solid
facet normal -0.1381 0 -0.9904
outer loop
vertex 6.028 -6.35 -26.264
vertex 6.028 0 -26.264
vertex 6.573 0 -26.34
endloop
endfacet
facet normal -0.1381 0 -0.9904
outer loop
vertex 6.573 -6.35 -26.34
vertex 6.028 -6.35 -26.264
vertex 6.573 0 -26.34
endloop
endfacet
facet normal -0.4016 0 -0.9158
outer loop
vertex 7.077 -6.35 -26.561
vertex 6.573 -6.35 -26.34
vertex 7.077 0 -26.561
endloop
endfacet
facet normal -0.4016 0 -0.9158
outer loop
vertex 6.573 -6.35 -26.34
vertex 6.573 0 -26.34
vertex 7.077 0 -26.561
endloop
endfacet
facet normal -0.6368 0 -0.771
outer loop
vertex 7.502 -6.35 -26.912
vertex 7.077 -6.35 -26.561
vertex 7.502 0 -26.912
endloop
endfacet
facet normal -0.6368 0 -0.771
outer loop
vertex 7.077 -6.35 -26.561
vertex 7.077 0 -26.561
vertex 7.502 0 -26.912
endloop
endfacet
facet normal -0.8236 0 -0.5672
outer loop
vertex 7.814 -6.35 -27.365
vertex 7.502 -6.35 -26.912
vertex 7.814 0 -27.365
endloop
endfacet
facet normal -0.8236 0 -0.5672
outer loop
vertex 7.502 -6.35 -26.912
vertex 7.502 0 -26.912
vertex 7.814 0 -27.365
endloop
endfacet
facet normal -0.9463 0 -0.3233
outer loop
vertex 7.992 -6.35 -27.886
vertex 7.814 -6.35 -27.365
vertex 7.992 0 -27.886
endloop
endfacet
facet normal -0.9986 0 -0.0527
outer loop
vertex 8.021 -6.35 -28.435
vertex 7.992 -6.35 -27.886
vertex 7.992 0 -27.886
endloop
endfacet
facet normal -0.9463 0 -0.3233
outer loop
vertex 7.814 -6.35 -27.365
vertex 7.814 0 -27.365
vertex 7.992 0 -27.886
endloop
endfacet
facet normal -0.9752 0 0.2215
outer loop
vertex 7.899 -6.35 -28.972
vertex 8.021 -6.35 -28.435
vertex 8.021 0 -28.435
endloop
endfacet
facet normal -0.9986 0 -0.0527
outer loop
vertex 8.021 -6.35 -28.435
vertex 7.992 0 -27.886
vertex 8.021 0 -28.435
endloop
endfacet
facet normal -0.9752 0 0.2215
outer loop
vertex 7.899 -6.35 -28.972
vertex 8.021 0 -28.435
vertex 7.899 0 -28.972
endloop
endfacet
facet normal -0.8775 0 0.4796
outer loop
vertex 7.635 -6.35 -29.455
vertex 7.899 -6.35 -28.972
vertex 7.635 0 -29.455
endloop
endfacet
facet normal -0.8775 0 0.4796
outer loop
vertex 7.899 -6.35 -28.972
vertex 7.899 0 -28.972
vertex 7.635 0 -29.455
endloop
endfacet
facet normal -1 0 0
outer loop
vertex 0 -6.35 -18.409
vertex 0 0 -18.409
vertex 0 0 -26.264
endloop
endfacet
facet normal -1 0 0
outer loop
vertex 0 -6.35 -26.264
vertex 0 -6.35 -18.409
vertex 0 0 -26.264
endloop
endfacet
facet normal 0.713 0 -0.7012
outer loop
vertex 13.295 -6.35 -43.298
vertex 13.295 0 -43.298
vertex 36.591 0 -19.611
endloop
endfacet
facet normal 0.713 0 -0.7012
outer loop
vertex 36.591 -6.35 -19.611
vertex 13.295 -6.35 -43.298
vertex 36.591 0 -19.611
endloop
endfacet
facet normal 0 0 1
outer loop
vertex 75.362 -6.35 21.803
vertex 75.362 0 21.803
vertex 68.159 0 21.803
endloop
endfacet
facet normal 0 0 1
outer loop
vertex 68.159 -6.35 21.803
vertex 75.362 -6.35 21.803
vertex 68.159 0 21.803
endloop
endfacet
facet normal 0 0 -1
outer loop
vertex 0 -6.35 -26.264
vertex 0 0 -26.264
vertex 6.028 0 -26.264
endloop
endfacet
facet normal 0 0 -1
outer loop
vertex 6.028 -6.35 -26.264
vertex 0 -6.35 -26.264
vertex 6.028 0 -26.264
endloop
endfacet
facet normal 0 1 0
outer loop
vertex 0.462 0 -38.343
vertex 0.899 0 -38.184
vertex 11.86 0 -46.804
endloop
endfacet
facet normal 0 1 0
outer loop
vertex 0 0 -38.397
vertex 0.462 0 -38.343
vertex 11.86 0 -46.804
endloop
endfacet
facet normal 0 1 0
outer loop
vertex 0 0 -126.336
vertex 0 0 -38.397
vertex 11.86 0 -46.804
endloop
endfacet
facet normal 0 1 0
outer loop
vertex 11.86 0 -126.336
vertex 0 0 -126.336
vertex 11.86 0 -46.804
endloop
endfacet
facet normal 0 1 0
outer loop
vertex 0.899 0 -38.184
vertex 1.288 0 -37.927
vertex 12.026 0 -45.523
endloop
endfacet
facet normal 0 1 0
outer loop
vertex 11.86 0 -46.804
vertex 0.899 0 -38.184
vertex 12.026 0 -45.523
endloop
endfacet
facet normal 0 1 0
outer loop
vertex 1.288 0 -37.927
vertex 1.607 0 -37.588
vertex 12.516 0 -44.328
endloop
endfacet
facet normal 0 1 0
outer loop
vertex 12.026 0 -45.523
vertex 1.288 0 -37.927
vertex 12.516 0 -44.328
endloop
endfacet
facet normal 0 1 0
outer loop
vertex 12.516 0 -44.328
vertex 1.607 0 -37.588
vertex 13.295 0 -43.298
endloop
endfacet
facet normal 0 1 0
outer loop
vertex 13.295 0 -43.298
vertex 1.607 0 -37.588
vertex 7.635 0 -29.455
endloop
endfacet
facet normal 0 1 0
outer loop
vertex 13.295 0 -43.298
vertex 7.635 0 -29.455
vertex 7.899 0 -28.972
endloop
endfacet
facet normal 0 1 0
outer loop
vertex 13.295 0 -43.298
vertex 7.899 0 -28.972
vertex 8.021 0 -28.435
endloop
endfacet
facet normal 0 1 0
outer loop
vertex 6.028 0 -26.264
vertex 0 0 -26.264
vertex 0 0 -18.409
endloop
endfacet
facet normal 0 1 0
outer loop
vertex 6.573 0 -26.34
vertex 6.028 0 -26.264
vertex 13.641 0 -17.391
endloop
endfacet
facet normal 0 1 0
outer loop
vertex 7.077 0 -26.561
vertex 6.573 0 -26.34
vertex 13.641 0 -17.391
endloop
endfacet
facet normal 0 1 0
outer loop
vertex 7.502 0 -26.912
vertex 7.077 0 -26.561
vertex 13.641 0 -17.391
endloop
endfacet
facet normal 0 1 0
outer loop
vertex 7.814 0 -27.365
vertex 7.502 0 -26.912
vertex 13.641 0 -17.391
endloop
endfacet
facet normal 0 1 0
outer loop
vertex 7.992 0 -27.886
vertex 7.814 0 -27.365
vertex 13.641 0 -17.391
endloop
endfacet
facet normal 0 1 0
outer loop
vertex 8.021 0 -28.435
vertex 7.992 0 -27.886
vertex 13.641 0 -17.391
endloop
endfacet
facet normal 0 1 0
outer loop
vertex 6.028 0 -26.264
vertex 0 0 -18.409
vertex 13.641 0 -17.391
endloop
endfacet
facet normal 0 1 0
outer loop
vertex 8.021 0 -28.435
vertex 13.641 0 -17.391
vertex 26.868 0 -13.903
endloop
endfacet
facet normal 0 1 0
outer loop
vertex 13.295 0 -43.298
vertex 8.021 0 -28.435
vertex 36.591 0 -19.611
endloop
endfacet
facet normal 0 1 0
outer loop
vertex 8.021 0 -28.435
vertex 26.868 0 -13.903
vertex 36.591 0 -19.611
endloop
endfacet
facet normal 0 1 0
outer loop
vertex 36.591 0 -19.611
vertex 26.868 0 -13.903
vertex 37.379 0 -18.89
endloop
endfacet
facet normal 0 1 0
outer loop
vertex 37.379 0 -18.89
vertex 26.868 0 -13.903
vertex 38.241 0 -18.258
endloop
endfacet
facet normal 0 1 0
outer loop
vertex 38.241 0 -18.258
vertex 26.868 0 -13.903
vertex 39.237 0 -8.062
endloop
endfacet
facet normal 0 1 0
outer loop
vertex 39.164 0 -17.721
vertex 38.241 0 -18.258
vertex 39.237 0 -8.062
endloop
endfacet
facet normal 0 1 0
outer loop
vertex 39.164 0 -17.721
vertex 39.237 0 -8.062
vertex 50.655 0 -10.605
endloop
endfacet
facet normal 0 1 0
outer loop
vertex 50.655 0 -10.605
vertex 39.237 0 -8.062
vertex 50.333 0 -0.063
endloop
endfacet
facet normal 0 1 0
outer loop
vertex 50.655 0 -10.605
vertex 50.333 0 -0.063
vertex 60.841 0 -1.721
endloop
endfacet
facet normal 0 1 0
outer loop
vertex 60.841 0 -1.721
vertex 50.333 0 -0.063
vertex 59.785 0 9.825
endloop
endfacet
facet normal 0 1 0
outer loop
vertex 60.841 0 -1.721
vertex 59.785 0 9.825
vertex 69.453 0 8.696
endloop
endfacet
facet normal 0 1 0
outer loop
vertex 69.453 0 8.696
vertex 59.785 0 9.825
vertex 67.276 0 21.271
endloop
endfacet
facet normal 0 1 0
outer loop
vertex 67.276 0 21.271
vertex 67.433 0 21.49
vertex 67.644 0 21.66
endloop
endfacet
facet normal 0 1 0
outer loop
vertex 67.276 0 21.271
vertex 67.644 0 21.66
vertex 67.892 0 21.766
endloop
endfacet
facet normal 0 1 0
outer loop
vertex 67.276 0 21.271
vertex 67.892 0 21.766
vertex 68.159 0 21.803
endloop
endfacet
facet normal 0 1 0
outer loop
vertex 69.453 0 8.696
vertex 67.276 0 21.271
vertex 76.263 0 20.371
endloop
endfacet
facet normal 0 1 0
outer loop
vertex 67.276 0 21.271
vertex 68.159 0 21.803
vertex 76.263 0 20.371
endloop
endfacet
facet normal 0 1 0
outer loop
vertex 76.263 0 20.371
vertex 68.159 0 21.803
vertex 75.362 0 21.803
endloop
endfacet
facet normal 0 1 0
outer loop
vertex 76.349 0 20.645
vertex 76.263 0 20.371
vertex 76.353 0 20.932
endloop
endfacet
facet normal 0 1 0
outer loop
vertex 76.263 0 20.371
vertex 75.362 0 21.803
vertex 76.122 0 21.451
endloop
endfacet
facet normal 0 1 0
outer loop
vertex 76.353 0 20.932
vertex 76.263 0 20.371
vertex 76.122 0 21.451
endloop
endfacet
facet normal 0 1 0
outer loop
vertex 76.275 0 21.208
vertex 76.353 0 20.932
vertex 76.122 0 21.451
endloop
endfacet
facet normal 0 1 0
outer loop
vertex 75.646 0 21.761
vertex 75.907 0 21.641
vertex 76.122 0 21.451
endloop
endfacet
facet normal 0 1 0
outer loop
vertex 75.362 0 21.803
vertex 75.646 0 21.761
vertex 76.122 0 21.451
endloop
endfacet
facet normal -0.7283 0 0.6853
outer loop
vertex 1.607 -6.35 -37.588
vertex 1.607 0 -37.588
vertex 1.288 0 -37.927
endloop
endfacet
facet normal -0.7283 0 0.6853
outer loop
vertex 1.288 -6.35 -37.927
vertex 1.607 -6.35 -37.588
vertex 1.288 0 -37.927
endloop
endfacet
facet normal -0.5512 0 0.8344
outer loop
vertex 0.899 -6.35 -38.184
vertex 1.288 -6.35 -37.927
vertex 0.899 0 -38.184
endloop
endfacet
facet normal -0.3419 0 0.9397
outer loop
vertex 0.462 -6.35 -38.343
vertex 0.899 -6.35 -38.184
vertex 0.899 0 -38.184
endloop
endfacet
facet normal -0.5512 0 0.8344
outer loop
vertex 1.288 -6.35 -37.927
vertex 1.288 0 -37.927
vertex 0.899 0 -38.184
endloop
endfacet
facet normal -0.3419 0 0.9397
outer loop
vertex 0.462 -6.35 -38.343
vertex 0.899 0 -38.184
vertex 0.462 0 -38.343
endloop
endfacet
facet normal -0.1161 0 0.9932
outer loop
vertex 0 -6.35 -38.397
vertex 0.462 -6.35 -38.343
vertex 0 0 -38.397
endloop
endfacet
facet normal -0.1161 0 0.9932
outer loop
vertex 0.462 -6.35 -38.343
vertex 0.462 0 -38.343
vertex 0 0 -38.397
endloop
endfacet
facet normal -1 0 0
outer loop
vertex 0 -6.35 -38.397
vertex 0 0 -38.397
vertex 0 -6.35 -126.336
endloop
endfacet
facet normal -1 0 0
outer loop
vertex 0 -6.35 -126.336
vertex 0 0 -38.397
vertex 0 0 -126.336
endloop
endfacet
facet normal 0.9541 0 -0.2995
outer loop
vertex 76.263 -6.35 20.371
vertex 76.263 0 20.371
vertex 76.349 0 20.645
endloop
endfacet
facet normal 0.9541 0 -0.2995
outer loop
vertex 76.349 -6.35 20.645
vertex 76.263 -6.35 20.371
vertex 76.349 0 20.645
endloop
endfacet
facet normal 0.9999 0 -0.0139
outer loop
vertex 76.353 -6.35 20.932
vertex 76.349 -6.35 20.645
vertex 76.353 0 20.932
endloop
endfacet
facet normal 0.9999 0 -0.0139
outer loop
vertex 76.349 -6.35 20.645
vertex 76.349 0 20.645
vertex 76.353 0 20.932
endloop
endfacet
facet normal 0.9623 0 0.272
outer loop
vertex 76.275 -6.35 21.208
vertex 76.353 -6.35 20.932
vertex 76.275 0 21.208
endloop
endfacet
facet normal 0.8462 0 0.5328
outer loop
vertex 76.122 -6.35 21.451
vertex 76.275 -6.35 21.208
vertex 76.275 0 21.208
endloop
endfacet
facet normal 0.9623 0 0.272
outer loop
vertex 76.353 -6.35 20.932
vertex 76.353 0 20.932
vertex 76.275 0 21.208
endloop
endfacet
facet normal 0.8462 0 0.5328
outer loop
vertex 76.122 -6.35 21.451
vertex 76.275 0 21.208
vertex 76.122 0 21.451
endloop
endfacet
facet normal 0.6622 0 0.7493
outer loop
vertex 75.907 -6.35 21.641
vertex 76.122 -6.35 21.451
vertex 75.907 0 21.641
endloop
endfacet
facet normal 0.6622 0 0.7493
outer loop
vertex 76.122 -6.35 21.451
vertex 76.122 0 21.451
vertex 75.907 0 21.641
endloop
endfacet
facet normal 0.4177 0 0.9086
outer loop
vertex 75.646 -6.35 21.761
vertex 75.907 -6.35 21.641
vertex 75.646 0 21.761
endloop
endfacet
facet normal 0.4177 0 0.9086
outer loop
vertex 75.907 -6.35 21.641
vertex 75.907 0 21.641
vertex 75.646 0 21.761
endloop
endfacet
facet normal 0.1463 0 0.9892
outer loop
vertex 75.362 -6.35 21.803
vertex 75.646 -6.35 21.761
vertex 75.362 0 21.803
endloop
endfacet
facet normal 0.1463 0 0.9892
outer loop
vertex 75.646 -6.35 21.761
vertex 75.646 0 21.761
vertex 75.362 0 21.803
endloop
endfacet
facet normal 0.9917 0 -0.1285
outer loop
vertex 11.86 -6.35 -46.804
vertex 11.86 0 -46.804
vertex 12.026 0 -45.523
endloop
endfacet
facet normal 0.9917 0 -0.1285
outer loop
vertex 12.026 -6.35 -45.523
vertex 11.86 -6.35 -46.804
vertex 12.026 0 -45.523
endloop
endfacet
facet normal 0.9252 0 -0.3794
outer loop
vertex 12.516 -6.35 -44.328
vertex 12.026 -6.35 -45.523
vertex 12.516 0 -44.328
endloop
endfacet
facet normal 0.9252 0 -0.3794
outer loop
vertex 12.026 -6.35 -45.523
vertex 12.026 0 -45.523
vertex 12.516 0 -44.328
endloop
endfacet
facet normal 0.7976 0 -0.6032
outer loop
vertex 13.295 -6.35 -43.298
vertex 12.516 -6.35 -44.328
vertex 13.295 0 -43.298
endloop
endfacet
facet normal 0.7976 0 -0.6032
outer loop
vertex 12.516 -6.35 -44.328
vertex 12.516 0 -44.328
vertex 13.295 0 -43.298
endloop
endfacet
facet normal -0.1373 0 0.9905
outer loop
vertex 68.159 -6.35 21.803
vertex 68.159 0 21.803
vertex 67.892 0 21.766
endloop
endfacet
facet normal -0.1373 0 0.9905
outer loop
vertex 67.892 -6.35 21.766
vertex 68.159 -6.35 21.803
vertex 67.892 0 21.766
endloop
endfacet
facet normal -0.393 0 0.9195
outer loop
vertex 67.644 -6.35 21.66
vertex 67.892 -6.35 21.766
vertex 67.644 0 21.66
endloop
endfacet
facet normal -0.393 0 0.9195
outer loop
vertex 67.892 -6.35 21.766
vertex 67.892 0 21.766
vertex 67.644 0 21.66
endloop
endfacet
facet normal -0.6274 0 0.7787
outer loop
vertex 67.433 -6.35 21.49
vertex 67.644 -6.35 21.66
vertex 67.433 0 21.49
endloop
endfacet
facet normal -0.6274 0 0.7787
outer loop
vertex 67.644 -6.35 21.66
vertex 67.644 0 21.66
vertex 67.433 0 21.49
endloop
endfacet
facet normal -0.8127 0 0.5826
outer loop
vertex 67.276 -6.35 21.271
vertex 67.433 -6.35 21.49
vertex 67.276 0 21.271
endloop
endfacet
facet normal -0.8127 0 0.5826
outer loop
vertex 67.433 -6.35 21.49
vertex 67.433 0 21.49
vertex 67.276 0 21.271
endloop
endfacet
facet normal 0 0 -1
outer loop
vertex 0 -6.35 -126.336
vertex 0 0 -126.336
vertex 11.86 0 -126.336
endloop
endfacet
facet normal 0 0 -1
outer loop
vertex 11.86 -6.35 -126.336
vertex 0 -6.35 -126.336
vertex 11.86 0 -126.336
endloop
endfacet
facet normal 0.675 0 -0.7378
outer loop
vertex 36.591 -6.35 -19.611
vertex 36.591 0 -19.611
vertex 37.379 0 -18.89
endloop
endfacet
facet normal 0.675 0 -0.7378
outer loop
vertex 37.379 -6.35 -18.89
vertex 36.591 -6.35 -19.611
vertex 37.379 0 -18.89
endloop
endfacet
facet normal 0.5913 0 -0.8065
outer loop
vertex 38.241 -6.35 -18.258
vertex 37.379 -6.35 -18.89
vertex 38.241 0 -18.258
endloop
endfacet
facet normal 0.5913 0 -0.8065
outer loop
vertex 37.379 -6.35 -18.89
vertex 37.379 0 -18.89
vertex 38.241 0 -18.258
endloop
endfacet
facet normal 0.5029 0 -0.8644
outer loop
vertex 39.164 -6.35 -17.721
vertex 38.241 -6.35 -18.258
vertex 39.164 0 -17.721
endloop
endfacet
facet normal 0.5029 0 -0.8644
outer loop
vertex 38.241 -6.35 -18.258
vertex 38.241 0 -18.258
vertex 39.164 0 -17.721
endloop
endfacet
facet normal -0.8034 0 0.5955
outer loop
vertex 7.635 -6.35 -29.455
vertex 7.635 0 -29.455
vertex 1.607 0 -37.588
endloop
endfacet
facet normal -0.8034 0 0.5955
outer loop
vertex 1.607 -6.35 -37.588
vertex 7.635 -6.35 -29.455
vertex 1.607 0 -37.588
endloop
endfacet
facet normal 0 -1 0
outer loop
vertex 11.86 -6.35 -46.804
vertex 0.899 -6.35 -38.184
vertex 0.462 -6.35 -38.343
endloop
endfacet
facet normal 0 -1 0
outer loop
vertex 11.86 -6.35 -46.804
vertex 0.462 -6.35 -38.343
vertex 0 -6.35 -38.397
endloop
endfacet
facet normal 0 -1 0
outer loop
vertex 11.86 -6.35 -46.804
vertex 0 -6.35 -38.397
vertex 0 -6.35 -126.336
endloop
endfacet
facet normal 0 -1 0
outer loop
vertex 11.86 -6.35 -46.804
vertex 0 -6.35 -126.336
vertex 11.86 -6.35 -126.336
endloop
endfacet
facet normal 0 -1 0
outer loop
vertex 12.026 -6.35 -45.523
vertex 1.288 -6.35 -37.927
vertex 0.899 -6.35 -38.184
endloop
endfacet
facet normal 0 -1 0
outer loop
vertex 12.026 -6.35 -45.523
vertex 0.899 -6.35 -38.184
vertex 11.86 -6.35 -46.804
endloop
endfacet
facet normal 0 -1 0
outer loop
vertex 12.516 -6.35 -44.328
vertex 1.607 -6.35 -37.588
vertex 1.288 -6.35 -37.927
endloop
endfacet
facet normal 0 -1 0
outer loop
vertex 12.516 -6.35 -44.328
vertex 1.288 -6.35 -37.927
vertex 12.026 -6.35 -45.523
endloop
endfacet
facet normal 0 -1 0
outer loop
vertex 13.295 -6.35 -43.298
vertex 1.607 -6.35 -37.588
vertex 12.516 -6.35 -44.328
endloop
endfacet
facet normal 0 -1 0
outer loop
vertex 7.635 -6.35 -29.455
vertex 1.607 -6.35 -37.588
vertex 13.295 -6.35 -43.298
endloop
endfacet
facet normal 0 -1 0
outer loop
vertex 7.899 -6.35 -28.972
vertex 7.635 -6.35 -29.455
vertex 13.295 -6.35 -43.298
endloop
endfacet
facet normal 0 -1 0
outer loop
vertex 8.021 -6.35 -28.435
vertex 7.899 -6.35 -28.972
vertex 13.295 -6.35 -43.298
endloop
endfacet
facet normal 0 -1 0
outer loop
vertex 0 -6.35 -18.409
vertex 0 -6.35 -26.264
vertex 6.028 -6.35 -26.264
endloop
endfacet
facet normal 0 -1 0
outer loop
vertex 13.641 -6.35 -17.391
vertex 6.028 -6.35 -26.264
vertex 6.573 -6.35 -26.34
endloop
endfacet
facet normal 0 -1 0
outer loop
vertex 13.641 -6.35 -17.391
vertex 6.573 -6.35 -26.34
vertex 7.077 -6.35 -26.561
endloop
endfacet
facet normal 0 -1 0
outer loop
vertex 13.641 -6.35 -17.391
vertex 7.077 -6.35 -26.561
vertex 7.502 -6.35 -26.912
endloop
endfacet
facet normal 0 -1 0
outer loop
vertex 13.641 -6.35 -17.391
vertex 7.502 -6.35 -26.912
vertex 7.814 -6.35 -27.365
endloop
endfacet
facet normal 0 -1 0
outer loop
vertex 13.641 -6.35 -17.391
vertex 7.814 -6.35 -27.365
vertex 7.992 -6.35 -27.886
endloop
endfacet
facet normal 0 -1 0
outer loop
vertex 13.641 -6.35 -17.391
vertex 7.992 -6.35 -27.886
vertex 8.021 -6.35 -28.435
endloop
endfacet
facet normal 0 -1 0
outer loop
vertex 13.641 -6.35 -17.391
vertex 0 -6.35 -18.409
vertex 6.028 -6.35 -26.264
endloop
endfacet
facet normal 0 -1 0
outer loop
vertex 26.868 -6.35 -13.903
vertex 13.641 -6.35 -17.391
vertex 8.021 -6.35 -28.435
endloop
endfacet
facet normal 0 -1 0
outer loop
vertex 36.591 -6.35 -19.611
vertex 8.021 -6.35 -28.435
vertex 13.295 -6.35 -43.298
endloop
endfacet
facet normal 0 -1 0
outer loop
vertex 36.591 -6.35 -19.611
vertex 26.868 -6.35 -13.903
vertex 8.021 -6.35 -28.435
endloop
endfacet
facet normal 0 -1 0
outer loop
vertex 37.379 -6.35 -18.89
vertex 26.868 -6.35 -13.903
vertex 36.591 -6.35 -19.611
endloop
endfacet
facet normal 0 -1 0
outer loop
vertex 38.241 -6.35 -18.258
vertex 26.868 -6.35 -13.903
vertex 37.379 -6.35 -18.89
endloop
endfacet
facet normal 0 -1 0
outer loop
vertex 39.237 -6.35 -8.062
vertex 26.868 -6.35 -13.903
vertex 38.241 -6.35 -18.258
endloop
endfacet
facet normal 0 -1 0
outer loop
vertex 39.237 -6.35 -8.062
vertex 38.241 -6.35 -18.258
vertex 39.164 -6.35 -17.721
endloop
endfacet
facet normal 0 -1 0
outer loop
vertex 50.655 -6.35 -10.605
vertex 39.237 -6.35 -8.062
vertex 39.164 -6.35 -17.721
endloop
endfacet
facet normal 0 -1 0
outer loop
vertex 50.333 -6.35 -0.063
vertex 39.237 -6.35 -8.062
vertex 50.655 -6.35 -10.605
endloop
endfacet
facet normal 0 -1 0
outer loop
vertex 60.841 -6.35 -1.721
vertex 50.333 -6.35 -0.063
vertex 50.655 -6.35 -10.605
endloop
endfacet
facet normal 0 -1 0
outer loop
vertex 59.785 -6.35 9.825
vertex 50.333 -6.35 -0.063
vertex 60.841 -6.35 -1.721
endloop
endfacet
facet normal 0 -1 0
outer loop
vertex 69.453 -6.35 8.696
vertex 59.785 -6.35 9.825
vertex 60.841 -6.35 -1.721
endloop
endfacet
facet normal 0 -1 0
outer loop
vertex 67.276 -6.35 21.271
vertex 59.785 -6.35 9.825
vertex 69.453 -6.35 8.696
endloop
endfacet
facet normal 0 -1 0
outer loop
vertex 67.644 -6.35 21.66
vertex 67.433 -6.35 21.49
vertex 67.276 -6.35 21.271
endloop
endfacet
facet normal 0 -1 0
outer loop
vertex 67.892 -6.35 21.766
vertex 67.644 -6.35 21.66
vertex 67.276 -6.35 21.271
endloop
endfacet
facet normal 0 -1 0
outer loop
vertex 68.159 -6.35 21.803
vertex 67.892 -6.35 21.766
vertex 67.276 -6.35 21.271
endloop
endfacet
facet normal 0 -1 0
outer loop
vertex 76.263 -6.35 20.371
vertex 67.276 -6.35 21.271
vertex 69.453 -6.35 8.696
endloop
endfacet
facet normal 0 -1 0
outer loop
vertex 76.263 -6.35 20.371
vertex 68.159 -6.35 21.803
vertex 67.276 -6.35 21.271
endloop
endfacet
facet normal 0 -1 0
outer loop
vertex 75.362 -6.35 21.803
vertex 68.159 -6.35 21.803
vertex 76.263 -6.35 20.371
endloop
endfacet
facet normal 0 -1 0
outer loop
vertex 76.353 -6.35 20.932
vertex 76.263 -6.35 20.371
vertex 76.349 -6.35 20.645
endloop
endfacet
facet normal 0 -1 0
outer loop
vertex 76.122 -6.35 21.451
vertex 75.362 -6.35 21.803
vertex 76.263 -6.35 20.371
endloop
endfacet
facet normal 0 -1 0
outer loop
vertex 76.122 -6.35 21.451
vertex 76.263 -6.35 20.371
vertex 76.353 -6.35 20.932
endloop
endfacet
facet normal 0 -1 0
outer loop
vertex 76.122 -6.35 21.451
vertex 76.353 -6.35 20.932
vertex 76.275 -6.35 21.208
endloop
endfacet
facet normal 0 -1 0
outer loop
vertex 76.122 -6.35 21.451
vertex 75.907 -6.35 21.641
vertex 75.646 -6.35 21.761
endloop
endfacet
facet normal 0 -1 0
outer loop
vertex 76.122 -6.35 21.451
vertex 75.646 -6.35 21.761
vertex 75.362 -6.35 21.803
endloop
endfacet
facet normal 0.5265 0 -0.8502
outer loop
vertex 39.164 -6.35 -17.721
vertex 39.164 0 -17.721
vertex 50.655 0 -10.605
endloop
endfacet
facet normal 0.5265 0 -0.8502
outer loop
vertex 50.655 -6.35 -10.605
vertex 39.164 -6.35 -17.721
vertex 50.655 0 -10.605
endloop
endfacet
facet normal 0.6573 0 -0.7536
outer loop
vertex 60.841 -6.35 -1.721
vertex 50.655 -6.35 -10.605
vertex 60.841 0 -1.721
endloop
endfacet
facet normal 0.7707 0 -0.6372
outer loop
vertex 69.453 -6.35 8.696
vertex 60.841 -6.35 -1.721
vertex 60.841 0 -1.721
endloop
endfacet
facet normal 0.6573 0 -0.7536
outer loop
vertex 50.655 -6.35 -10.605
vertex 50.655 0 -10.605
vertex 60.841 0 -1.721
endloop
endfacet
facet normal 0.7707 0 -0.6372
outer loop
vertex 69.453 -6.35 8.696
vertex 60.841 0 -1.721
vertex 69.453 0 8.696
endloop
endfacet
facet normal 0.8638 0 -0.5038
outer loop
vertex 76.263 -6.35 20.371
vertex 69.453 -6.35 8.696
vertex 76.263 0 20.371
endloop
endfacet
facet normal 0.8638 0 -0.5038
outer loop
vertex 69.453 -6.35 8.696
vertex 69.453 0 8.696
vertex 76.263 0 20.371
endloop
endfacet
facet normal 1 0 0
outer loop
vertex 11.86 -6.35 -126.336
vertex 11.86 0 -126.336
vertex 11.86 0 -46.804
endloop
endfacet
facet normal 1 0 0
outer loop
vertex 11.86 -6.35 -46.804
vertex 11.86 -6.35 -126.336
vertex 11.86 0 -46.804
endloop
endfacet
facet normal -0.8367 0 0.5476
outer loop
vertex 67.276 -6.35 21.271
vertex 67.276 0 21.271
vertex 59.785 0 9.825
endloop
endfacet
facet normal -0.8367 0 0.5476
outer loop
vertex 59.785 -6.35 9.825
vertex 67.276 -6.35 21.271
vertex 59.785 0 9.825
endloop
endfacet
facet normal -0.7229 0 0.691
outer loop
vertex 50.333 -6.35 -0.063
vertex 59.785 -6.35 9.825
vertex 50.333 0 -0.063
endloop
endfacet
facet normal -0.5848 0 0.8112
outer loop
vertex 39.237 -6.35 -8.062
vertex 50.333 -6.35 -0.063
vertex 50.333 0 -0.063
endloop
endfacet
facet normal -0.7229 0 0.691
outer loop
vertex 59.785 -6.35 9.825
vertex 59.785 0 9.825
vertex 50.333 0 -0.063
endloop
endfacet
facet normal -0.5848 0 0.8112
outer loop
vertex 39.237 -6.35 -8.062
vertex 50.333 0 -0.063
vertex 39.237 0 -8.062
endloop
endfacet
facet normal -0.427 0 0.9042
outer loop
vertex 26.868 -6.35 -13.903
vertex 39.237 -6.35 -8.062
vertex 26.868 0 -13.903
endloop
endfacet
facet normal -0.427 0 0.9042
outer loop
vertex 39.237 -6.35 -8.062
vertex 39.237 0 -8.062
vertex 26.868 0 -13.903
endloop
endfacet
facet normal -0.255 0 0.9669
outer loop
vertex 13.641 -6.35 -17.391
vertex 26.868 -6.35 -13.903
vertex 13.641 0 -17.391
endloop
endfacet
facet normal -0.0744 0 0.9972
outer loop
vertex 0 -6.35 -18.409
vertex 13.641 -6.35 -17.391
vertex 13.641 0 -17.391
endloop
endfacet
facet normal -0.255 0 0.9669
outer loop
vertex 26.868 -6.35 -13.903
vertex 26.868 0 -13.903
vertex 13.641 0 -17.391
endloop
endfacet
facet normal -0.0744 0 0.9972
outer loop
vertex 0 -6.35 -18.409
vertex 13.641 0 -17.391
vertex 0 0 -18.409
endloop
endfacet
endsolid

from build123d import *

# Parameters (mm, degrees)
F1_DEPTH = 6.35


with BuildPart() as f1:
    # F0 (on Front) → F1 (new body)
    with BuildSketch(Plane.XZ):
        with BuildLine():
            Line((75.361562, 21.802573), (68.159193, 21.802573))
            ThreePointArc((68.159193, 21.802573), (67.643768, 21.659507), (67.275821, 21.271246))
            ThreePointArc((67.275821, 21.271246), (39.236961, -8.061658), (0, -18.408534))
            Line((0, -18.408534), (0, -26.264148))
            Line((0, -26.264148), (6.028164, -26.264148))
            ThreePointArc((6.028164, -26.264148), (7.814478, -27.364658), (7.634936, -29.455065))
            Line((7.634936, -29.455065), (1.606772, -37.588195))
            ThreePointArc((1.606772, -37.588195), (0.89949, -38.183592), (0, -38.397278))
            Line((0, -38.397278), (0, -126.335785))
            Line((0, -126.335785), (11.859682, -126.335785))
            Line((11.859682, -126.335785), (11.859682, -46.803811))
            ThreePointArc((11.859682, -46.803811), (12.232361, -44.909636), (13.294841, -43.29783))
            Line((13.294841, -43.29783), (36.590743, -19.610819))
            ThreePointArc((36.590743, -19.610819), (37.801559, -18.56257), (39.164187, -17.721058))
            ThreePointArc((39.164187, -17.721058), (60.841409, -1.721337), (76.263449, 20.370601))
            ThreePointArc((76.263449, 20.370601), (76.207722, 21.335503), (75.361562, 21.802573))
        make_face()
    extrude(amount=F1_DEPTH)


solid = f1.part
